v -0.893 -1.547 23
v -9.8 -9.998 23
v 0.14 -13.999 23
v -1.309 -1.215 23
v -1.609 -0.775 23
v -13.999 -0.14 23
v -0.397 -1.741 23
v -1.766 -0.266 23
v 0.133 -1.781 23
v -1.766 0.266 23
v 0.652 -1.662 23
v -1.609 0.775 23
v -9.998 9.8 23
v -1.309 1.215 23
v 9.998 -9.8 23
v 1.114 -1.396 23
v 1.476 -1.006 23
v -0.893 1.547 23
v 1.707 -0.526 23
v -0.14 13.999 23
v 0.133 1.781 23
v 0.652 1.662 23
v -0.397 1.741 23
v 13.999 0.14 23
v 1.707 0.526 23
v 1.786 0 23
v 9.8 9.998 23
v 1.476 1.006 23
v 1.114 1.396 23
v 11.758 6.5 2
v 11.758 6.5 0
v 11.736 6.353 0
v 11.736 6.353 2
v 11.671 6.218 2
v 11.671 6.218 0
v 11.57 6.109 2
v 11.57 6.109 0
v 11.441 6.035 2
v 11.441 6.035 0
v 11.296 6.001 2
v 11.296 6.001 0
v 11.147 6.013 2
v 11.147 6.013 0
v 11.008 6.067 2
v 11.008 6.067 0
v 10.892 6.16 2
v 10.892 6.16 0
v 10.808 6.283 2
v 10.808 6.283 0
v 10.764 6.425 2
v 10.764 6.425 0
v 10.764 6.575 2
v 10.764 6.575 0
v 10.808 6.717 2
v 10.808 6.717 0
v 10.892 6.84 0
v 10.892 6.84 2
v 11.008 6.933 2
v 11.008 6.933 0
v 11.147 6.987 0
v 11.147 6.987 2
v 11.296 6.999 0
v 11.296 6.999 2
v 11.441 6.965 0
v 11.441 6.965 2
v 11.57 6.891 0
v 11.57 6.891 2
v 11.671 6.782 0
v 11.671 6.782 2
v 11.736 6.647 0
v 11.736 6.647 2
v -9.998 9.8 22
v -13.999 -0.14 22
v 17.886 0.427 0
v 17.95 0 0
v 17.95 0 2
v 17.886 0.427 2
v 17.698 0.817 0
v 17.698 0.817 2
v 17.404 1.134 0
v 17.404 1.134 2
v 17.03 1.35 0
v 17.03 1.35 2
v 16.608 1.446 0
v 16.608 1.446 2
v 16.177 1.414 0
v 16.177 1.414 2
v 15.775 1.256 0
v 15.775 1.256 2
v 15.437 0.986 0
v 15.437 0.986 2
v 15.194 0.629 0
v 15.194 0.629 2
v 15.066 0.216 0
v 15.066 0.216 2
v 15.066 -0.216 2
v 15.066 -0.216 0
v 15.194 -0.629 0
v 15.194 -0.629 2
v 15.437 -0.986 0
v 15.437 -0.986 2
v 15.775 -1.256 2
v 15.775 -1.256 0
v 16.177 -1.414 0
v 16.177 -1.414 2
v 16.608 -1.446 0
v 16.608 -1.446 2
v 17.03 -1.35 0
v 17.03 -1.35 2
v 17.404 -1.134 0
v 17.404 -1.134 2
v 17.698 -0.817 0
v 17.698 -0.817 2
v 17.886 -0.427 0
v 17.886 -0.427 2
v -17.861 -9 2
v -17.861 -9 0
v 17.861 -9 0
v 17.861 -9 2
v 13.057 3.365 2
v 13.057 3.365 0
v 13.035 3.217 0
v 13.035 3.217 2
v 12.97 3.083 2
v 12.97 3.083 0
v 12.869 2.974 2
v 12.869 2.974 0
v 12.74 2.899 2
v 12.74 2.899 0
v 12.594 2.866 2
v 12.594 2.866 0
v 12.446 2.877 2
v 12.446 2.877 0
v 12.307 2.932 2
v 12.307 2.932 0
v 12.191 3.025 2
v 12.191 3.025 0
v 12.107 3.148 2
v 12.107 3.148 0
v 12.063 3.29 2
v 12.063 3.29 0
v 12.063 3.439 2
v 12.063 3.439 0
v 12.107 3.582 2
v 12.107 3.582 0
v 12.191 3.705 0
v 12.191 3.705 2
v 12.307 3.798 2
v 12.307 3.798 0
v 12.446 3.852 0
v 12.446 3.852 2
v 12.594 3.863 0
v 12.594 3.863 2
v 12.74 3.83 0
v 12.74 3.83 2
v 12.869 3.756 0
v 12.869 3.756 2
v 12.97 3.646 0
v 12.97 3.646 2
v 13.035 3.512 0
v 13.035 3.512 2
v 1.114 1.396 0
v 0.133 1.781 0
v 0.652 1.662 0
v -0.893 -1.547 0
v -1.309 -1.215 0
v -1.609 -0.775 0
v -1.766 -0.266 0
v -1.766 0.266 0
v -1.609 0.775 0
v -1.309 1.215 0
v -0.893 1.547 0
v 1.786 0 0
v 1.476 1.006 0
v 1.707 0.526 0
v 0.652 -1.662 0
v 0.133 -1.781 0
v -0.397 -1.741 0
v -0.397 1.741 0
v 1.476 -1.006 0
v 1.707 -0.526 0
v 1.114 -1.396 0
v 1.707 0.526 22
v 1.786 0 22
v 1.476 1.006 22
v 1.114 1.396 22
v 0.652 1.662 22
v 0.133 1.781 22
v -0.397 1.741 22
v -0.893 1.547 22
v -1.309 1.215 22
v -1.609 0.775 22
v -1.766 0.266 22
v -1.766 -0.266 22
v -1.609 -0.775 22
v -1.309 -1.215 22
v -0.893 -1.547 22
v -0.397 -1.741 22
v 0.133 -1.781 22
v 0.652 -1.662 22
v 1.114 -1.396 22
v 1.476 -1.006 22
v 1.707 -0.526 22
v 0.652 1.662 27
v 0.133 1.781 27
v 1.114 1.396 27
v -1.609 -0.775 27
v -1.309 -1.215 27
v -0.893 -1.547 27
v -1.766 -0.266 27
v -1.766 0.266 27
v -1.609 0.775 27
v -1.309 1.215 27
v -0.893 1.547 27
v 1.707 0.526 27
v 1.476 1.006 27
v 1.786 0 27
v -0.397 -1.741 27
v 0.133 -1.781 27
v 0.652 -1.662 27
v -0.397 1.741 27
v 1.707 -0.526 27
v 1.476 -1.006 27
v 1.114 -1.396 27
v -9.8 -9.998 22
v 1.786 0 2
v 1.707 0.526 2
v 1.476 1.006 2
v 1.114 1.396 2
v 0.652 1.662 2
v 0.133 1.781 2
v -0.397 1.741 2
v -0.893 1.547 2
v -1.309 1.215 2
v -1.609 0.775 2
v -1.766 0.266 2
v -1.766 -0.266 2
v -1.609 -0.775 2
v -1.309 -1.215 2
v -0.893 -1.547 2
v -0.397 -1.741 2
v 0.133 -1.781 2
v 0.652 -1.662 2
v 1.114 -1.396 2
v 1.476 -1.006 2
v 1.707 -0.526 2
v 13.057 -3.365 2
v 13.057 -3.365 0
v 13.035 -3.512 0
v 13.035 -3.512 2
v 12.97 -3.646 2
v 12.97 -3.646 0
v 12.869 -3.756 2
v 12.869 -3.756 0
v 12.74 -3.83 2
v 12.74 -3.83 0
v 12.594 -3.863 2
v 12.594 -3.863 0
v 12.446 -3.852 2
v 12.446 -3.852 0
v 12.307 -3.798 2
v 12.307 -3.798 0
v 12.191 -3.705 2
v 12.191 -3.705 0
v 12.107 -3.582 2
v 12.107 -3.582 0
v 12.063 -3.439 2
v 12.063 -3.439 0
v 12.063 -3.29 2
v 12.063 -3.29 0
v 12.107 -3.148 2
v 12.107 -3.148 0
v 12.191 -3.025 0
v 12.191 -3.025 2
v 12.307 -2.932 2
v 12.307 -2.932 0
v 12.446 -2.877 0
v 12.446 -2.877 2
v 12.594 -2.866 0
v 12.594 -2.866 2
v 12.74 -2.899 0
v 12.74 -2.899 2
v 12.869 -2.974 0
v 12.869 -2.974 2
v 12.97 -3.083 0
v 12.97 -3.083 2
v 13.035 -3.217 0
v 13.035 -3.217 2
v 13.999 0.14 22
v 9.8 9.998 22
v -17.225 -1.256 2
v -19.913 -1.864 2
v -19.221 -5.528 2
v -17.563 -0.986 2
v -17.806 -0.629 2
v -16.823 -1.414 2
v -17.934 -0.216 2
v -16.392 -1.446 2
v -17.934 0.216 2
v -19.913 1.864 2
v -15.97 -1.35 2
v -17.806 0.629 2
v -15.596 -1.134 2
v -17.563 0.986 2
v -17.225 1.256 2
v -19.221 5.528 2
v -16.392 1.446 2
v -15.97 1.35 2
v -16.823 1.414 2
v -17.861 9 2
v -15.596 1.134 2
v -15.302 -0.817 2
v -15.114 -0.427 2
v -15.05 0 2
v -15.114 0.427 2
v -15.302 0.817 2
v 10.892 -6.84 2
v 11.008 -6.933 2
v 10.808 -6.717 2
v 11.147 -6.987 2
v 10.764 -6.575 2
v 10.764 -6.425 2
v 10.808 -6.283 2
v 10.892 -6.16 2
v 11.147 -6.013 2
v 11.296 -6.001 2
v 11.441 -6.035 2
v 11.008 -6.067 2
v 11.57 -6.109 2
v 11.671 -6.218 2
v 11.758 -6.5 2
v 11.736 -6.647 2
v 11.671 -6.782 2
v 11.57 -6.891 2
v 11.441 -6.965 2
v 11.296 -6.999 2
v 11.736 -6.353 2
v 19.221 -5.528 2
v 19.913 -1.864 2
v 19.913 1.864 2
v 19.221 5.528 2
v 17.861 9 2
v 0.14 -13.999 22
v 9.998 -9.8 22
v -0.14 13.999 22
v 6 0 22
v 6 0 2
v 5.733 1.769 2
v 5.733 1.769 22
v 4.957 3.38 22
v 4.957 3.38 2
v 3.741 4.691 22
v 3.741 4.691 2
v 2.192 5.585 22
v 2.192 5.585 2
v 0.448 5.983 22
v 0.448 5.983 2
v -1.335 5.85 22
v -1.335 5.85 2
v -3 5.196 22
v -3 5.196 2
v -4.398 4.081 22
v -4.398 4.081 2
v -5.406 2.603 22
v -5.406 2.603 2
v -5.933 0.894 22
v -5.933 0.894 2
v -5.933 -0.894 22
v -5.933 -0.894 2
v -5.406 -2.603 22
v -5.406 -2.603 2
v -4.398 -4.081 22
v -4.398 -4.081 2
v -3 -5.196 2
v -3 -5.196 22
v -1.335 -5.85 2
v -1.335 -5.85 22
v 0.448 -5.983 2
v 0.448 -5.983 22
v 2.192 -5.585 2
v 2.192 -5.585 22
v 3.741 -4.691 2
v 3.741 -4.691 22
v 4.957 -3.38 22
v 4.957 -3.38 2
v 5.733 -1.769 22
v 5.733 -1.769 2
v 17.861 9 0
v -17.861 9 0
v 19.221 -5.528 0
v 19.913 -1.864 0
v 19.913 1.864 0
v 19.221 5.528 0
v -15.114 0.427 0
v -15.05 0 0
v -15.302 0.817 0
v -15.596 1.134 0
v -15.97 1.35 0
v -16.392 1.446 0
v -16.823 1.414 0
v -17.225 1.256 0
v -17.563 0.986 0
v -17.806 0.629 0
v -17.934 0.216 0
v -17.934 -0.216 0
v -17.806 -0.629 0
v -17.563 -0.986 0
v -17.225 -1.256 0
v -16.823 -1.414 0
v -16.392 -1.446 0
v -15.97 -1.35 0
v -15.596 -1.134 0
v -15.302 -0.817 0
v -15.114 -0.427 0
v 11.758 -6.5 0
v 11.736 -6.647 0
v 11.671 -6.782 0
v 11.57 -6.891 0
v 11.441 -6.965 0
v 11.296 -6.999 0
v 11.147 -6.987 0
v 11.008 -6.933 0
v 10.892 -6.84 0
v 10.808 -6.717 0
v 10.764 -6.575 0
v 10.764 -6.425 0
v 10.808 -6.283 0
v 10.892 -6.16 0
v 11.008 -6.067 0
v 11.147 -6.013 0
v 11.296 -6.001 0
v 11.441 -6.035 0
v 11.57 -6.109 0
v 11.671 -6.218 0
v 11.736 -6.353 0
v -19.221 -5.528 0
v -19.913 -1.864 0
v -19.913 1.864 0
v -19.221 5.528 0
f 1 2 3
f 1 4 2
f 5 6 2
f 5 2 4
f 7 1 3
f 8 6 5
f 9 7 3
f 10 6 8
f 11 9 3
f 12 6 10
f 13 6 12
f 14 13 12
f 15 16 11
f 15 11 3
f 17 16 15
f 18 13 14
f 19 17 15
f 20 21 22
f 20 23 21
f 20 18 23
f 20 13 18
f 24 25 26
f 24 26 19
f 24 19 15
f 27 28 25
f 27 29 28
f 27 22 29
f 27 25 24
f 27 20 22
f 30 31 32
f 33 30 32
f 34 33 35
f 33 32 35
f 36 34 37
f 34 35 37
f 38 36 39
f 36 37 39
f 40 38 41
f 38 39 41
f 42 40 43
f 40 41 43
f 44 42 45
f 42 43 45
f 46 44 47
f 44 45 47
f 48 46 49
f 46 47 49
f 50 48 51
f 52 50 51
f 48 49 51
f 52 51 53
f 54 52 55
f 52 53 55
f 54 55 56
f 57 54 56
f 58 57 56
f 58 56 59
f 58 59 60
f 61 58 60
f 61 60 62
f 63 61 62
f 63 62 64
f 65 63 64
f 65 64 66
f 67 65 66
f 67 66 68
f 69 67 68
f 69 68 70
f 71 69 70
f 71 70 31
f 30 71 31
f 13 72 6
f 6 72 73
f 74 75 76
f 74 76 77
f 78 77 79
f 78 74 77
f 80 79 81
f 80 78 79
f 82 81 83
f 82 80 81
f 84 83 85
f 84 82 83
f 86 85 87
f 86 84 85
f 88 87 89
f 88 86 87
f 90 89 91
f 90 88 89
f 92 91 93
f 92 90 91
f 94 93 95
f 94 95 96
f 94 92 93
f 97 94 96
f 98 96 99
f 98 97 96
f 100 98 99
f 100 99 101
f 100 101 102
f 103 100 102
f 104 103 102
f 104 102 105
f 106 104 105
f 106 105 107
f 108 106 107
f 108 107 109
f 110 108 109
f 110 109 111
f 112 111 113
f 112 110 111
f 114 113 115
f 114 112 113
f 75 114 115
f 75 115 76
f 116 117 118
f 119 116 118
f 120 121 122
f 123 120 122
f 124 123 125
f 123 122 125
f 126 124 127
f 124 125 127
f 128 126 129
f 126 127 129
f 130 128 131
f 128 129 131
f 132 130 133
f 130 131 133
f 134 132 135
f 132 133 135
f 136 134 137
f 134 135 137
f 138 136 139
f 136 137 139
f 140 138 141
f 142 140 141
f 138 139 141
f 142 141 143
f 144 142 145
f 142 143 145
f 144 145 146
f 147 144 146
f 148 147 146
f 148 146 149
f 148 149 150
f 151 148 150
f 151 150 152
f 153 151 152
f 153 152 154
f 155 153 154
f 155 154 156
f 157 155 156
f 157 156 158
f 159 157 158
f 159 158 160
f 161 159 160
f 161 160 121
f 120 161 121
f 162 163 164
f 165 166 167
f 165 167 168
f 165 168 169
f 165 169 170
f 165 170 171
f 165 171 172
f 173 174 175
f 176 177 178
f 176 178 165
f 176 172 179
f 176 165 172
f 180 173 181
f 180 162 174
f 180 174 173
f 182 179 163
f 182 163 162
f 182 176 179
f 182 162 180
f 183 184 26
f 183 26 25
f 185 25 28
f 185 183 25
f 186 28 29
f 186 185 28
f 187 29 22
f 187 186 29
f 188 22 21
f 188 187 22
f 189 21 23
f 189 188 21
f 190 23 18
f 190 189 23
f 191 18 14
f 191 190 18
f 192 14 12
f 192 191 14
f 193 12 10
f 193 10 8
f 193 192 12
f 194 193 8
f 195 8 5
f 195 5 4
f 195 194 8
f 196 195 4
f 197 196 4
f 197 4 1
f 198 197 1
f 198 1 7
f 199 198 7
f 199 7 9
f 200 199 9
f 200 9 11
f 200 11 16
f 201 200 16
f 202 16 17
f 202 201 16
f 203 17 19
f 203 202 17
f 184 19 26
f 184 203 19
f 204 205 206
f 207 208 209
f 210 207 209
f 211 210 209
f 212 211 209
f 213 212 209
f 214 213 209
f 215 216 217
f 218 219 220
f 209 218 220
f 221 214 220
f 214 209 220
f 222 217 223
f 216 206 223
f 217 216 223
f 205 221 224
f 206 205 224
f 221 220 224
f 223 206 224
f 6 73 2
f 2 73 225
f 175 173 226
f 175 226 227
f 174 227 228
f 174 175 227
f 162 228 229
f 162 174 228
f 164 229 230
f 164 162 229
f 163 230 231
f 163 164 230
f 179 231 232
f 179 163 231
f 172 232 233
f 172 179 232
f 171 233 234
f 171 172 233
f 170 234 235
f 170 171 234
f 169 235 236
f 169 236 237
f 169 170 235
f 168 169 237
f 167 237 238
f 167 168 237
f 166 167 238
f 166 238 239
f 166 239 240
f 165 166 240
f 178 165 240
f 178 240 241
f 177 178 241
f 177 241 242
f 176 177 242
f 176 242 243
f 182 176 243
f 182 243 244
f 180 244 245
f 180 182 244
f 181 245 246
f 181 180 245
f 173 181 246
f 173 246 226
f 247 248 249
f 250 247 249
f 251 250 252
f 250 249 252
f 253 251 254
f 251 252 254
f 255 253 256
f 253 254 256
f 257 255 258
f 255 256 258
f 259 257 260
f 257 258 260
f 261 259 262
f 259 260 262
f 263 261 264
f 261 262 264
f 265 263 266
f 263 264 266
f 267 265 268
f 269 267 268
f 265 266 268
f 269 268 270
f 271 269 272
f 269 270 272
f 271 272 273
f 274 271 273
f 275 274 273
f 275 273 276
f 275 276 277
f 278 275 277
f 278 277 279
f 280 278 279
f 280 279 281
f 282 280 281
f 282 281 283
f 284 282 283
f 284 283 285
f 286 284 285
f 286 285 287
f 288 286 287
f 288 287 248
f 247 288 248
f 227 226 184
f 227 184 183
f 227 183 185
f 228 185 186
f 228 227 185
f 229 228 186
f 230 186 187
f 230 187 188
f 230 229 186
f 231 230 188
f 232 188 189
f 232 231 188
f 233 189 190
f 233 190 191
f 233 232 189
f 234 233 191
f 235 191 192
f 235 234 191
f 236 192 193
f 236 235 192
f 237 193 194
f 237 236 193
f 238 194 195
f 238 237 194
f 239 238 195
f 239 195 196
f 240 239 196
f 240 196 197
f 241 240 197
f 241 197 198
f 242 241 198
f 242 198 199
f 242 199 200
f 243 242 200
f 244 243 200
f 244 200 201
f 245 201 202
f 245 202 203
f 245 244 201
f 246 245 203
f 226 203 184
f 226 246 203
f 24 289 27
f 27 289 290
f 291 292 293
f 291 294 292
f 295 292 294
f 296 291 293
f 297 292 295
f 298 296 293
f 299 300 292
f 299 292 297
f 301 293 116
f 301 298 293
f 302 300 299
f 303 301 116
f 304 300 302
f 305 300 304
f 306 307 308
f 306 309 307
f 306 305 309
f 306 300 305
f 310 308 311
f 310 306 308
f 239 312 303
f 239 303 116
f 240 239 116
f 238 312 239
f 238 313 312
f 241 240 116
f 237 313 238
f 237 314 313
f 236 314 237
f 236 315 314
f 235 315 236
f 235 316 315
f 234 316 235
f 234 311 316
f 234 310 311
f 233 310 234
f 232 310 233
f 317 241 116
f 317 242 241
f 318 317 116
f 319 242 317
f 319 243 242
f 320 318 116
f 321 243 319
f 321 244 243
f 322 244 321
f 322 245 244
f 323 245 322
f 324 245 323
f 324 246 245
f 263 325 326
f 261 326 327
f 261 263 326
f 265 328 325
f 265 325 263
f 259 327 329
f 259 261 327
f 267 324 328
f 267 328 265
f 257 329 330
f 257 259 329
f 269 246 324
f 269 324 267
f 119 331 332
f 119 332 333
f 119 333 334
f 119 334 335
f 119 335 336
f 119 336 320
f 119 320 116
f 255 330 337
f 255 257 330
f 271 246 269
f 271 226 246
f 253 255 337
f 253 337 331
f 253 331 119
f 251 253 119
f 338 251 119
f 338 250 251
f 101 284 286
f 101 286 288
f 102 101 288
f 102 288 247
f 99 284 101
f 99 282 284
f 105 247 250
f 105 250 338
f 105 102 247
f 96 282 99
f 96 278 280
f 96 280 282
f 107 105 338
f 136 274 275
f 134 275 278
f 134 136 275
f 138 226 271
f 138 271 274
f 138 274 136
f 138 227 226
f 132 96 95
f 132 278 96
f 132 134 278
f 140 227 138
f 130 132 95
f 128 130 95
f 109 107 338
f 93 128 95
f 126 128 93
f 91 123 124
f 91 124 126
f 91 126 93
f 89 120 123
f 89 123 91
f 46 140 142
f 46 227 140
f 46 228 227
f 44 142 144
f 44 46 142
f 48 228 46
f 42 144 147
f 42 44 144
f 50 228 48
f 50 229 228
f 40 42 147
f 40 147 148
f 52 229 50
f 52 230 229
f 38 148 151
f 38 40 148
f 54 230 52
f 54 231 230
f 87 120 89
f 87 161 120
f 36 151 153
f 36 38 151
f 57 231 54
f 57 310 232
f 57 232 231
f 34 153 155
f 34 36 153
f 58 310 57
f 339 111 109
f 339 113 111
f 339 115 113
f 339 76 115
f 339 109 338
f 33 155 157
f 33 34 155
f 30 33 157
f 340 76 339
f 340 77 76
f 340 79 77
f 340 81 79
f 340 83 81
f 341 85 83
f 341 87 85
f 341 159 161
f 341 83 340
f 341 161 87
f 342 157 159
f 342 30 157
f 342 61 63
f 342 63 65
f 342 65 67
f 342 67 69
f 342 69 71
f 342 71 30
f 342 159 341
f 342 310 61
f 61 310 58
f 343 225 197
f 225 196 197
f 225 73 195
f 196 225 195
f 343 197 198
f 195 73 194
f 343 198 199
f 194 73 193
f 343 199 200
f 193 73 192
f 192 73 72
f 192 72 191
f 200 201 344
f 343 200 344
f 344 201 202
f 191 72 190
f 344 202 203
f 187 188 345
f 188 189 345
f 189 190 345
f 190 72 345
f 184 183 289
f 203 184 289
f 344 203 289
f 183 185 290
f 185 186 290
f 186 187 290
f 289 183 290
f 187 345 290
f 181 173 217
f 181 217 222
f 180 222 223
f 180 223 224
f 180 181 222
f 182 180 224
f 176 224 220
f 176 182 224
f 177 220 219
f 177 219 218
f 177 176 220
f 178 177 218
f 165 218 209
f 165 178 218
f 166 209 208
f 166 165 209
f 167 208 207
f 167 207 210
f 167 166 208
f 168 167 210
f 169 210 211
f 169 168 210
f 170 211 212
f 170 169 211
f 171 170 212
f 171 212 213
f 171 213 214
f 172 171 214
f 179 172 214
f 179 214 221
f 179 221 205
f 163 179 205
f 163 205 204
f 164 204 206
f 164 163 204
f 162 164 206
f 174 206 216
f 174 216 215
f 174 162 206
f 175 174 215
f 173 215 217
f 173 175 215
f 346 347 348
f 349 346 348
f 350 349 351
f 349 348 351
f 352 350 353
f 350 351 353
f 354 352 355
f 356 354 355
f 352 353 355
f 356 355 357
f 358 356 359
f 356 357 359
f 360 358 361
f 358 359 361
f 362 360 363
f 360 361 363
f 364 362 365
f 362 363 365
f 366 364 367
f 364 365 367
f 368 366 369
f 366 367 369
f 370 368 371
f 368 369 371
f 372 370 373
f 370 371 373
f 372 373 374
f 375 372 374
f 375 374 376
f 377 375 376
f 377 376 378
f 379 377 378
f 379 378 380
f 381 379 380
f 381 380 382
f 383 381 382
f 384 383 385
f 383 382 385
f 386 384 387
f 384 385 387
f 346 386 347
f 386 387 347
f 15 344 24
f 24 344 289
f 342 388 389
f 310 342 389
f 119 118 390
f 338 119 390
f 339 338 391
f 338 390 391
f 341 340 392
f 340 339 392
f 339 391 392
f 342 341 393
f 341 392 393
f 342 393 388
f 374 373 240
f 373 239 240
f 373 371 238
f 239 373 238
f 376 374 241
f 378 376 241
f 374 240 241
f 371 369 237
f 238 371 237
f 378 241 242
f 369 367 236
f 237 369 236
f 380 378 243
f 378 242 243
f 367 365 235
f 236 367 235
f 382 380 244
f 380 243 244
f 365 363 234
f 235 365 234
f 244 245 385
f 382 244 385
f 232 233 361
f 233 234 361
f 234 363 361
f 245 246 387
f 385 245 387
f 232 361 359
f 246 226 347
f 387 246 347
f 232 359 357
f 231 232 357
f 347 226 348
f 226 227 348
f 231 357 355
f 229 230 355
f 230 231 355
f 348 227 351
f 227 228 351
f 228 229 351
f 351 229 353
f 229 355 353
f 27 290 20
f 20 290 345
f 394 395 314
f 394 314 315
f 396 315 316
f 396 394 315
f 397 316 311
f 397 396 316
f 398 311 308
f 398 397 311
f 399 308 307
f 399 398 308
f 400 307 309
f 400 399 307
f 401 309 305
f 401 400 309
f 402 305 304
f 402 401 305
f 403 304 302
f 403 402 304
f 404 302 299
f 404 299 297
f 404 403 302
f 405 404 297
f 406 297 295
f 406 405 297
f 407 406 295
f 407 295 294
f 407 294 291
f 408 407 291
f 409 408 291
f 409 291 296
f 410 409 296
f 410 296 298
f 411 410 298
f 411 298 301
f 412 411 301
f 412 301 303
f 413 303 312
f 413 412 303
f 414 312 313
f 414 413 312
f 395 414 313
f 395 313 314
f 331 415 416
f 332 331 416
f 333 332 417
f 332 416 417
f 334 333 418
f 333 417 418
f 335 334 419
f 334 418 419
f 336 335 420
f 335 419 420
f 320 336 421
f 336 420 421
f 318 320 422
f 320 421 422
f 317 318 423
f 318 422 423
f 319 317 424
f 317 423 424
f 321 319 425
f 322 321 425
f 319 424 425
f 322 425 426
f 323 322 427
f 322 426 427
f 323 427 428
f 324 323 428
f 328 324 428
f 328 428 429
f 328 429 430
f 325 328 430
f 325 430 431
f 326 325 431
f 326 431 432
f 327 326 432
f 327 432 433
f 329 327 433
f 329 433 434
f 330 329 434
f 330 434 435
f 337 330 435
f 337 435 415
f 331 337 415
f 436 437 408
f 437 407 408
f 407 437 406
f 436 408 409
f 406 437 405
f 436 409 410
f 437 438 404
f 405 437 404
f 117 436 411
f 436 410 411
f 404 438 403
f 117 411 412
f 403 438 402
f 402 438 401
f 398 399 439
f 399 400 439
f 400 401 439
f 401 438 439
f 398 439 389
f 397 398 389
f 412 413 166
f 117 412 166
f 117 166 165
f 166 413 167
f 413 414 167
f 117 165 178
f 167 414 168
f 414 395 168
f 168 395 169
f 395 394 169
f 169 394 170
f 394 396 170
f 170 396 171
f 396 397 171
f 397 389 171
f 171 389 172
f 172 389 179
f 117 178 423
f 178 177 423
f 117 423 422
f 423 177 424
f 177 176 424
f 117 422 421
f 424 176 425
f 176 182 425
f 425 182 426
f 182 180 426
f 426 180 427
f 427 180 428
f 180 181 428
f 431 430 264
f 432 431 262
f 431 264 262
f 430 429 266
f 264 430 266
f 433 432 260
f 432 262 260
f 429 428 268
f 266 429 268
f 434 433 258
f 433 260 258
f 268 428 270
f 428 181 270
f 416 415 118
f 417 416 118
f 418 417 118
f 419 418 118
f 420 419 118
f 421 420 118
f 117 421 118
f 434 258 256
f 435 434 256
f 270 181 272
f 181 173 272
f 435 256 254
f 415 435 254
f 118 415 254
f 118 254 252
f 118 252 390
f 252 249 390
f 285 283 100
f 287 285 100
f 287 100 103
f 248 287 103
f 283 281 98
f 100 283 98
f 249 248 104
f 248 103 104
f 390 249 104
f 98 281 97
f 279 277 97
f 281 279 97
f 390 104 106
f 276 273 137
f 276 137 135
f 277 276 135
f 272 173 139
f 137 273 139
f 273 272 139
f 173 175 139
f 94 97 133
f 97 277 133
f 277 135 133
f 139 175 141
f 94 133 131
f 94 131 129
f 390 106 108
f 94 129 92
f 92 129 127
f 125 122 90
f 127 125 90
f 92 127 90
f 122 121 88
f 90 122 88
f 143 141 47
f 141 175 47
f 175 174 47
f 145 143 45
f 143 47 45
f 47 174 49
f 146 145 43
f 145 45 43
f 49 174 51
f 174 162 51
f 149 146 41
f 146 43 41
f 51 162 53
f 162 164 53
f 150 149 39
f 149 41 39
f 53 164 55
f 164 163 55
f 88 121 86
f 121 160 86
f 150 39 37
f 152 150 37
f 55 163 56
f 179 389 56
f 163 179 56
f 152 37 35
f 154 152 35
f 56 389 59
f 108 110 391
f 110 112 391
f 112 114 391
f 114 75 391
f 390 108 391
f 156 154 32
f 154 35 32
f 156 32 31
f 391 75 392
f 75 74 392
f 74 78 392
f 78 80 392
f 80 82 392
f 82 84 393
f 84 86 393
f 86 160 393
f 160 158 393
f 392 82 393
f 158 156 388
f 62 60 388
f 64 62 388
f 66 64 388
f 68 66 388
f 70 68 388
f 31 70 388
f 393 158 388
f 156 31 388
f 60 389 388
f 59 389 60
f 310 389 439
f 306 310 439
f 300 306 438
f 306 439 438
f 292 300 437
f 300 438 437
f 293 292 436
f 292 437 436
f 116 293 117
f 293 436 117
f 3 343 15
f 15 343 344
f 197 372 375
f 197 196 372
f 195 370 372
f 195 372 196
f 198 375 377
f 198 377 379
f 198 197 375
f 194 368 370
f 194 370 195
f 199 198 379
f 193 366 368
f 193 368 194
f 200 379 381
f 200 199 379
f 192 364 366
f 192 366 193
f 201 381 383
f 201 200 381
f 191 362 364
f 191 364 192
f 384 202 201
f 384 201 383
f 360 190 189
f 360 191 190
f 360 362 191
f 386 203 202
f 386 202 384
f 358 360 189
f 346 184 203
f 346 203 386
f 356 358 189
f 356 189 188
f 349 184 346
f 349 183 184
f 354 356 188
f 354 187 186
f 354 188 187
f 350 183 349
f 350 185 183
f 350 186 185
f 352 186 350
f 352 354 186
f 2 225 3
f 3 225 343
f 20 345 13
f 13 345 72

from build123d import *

# Parameters (mm, degrees)
F0_R      = 20
F0_R_2    = 1.45
F0_R_3    = 1.7859375
F1_DEPTH  = 2
F2_R      = 6
F2_R_2    = 1.7859375
F3_DEPTH  = 20
F4_R      = 1.7859375
F5_DEPTH  = 27
F6_R      = 1.7859375
F7_DEPTH  = 1
F9_DEPTH  = 25
F10_R     = 0.5
F11_DEPTH = 25


with BuildPart() as f1:
    # F0 (on Top) → F1 (new body)
    with BuildSketch(Plane.XY):
        Circle(F0_R)
        with Locations((-16.5, 0)):
            Circle(F0_R_2, mode=Mode.SUBTRACT)
        Circle(F0_R_3, mode=Mode.SUBTRACT)
        with Locations((16.5, 0)):
            Circle(F0_R_2, mode=Mode.SUBTRACT)
    extrude(amount=F1_DEPTH)

    # F8 (on face) → F9 (cut)
    with BuildSketch(Plane(origin=(0, 0, 0), x_dir=(1, 0, 0), z_dir=(0, 0, -1))):
        with BuildLine():
            ThreePointArc((17.8605710995, 9), (0, 20), (-17.8605710995, 9))
            Line((-17.8605710995, 9), (17.8605710995, 9))
        make_face()
        with BuildLine():
            Line((17.8605710995, -9), (-17.8605710995, -9))
            ThreePointArc((-17.8605710995, -9), (0, -20), (17.8605710995, -9))
        make_face()
    extrude(amount=-F9_DEPTH, mode=Mode.SUBTRACT)

    # F10 (on face) → F11 (cut)
    with BuildSketch(Plane(origin=(0, 0, 0), x_dir=(1, 0, 0), z_dir=(0, 0, -1))):
        with Locations((11.2583302492, 6.5)):
            Circle(F10_R)
        with Locations((12.5570357418, 3.3646475863)):
            Circle(F10_R)
        with Locations((12.5570357418, -3.3646475863)):
            Circle(F10_R)
        with Locations((11.2583302492, -6.5)):
            Circle(F10_R)
    extrude(amount=-F11_DEPTH, mode=Mode.SUBTRACT)


with BuildPart() as f3:
    # F2 (on face) → F3 (new body)
    with BuildSketch(Plane.XY.offset(2)):
        Circle(F2_R)
        Circle(F2_R_2, mode=Mode.SUBTRACT)
    extrude(amount=F3_DEPTH)


with BuildPart() as f5:
    # F4 (on face) → F5 (new body)
    with BuildSketch(Plane(origin=(0, 0, 0), x_dir=(1, 0, 0), z_dir=(0, 0, -1))):
        Circle(F4_R)
    extrude(amount=-F5_DEPTH)


with BuildPart() as f7:
    # F6 (on face) → F7 (new body)
    with BuildSketch(Plane.XY.offset(22)):
        Polygon((-0.1404503089, 13.9992954719), (-9.9983101259, 9.7996833942), (-13.9992954719, -0.1404503089), (-9.7996833942, -9.9983101259), (0.1404503089, -13.9992954719), (9.9983101259, -9.7996833942), (13.9992954719, 0.1404503089), (9.7996833942, 9.9983101259), align=None)
        Circle(F6_R, mode=Mode.SUBTRACT)
    extrude(amount=F7_DEPTH)


solid = Compound([f1.part, f3.part, f5.part, f7.part])
